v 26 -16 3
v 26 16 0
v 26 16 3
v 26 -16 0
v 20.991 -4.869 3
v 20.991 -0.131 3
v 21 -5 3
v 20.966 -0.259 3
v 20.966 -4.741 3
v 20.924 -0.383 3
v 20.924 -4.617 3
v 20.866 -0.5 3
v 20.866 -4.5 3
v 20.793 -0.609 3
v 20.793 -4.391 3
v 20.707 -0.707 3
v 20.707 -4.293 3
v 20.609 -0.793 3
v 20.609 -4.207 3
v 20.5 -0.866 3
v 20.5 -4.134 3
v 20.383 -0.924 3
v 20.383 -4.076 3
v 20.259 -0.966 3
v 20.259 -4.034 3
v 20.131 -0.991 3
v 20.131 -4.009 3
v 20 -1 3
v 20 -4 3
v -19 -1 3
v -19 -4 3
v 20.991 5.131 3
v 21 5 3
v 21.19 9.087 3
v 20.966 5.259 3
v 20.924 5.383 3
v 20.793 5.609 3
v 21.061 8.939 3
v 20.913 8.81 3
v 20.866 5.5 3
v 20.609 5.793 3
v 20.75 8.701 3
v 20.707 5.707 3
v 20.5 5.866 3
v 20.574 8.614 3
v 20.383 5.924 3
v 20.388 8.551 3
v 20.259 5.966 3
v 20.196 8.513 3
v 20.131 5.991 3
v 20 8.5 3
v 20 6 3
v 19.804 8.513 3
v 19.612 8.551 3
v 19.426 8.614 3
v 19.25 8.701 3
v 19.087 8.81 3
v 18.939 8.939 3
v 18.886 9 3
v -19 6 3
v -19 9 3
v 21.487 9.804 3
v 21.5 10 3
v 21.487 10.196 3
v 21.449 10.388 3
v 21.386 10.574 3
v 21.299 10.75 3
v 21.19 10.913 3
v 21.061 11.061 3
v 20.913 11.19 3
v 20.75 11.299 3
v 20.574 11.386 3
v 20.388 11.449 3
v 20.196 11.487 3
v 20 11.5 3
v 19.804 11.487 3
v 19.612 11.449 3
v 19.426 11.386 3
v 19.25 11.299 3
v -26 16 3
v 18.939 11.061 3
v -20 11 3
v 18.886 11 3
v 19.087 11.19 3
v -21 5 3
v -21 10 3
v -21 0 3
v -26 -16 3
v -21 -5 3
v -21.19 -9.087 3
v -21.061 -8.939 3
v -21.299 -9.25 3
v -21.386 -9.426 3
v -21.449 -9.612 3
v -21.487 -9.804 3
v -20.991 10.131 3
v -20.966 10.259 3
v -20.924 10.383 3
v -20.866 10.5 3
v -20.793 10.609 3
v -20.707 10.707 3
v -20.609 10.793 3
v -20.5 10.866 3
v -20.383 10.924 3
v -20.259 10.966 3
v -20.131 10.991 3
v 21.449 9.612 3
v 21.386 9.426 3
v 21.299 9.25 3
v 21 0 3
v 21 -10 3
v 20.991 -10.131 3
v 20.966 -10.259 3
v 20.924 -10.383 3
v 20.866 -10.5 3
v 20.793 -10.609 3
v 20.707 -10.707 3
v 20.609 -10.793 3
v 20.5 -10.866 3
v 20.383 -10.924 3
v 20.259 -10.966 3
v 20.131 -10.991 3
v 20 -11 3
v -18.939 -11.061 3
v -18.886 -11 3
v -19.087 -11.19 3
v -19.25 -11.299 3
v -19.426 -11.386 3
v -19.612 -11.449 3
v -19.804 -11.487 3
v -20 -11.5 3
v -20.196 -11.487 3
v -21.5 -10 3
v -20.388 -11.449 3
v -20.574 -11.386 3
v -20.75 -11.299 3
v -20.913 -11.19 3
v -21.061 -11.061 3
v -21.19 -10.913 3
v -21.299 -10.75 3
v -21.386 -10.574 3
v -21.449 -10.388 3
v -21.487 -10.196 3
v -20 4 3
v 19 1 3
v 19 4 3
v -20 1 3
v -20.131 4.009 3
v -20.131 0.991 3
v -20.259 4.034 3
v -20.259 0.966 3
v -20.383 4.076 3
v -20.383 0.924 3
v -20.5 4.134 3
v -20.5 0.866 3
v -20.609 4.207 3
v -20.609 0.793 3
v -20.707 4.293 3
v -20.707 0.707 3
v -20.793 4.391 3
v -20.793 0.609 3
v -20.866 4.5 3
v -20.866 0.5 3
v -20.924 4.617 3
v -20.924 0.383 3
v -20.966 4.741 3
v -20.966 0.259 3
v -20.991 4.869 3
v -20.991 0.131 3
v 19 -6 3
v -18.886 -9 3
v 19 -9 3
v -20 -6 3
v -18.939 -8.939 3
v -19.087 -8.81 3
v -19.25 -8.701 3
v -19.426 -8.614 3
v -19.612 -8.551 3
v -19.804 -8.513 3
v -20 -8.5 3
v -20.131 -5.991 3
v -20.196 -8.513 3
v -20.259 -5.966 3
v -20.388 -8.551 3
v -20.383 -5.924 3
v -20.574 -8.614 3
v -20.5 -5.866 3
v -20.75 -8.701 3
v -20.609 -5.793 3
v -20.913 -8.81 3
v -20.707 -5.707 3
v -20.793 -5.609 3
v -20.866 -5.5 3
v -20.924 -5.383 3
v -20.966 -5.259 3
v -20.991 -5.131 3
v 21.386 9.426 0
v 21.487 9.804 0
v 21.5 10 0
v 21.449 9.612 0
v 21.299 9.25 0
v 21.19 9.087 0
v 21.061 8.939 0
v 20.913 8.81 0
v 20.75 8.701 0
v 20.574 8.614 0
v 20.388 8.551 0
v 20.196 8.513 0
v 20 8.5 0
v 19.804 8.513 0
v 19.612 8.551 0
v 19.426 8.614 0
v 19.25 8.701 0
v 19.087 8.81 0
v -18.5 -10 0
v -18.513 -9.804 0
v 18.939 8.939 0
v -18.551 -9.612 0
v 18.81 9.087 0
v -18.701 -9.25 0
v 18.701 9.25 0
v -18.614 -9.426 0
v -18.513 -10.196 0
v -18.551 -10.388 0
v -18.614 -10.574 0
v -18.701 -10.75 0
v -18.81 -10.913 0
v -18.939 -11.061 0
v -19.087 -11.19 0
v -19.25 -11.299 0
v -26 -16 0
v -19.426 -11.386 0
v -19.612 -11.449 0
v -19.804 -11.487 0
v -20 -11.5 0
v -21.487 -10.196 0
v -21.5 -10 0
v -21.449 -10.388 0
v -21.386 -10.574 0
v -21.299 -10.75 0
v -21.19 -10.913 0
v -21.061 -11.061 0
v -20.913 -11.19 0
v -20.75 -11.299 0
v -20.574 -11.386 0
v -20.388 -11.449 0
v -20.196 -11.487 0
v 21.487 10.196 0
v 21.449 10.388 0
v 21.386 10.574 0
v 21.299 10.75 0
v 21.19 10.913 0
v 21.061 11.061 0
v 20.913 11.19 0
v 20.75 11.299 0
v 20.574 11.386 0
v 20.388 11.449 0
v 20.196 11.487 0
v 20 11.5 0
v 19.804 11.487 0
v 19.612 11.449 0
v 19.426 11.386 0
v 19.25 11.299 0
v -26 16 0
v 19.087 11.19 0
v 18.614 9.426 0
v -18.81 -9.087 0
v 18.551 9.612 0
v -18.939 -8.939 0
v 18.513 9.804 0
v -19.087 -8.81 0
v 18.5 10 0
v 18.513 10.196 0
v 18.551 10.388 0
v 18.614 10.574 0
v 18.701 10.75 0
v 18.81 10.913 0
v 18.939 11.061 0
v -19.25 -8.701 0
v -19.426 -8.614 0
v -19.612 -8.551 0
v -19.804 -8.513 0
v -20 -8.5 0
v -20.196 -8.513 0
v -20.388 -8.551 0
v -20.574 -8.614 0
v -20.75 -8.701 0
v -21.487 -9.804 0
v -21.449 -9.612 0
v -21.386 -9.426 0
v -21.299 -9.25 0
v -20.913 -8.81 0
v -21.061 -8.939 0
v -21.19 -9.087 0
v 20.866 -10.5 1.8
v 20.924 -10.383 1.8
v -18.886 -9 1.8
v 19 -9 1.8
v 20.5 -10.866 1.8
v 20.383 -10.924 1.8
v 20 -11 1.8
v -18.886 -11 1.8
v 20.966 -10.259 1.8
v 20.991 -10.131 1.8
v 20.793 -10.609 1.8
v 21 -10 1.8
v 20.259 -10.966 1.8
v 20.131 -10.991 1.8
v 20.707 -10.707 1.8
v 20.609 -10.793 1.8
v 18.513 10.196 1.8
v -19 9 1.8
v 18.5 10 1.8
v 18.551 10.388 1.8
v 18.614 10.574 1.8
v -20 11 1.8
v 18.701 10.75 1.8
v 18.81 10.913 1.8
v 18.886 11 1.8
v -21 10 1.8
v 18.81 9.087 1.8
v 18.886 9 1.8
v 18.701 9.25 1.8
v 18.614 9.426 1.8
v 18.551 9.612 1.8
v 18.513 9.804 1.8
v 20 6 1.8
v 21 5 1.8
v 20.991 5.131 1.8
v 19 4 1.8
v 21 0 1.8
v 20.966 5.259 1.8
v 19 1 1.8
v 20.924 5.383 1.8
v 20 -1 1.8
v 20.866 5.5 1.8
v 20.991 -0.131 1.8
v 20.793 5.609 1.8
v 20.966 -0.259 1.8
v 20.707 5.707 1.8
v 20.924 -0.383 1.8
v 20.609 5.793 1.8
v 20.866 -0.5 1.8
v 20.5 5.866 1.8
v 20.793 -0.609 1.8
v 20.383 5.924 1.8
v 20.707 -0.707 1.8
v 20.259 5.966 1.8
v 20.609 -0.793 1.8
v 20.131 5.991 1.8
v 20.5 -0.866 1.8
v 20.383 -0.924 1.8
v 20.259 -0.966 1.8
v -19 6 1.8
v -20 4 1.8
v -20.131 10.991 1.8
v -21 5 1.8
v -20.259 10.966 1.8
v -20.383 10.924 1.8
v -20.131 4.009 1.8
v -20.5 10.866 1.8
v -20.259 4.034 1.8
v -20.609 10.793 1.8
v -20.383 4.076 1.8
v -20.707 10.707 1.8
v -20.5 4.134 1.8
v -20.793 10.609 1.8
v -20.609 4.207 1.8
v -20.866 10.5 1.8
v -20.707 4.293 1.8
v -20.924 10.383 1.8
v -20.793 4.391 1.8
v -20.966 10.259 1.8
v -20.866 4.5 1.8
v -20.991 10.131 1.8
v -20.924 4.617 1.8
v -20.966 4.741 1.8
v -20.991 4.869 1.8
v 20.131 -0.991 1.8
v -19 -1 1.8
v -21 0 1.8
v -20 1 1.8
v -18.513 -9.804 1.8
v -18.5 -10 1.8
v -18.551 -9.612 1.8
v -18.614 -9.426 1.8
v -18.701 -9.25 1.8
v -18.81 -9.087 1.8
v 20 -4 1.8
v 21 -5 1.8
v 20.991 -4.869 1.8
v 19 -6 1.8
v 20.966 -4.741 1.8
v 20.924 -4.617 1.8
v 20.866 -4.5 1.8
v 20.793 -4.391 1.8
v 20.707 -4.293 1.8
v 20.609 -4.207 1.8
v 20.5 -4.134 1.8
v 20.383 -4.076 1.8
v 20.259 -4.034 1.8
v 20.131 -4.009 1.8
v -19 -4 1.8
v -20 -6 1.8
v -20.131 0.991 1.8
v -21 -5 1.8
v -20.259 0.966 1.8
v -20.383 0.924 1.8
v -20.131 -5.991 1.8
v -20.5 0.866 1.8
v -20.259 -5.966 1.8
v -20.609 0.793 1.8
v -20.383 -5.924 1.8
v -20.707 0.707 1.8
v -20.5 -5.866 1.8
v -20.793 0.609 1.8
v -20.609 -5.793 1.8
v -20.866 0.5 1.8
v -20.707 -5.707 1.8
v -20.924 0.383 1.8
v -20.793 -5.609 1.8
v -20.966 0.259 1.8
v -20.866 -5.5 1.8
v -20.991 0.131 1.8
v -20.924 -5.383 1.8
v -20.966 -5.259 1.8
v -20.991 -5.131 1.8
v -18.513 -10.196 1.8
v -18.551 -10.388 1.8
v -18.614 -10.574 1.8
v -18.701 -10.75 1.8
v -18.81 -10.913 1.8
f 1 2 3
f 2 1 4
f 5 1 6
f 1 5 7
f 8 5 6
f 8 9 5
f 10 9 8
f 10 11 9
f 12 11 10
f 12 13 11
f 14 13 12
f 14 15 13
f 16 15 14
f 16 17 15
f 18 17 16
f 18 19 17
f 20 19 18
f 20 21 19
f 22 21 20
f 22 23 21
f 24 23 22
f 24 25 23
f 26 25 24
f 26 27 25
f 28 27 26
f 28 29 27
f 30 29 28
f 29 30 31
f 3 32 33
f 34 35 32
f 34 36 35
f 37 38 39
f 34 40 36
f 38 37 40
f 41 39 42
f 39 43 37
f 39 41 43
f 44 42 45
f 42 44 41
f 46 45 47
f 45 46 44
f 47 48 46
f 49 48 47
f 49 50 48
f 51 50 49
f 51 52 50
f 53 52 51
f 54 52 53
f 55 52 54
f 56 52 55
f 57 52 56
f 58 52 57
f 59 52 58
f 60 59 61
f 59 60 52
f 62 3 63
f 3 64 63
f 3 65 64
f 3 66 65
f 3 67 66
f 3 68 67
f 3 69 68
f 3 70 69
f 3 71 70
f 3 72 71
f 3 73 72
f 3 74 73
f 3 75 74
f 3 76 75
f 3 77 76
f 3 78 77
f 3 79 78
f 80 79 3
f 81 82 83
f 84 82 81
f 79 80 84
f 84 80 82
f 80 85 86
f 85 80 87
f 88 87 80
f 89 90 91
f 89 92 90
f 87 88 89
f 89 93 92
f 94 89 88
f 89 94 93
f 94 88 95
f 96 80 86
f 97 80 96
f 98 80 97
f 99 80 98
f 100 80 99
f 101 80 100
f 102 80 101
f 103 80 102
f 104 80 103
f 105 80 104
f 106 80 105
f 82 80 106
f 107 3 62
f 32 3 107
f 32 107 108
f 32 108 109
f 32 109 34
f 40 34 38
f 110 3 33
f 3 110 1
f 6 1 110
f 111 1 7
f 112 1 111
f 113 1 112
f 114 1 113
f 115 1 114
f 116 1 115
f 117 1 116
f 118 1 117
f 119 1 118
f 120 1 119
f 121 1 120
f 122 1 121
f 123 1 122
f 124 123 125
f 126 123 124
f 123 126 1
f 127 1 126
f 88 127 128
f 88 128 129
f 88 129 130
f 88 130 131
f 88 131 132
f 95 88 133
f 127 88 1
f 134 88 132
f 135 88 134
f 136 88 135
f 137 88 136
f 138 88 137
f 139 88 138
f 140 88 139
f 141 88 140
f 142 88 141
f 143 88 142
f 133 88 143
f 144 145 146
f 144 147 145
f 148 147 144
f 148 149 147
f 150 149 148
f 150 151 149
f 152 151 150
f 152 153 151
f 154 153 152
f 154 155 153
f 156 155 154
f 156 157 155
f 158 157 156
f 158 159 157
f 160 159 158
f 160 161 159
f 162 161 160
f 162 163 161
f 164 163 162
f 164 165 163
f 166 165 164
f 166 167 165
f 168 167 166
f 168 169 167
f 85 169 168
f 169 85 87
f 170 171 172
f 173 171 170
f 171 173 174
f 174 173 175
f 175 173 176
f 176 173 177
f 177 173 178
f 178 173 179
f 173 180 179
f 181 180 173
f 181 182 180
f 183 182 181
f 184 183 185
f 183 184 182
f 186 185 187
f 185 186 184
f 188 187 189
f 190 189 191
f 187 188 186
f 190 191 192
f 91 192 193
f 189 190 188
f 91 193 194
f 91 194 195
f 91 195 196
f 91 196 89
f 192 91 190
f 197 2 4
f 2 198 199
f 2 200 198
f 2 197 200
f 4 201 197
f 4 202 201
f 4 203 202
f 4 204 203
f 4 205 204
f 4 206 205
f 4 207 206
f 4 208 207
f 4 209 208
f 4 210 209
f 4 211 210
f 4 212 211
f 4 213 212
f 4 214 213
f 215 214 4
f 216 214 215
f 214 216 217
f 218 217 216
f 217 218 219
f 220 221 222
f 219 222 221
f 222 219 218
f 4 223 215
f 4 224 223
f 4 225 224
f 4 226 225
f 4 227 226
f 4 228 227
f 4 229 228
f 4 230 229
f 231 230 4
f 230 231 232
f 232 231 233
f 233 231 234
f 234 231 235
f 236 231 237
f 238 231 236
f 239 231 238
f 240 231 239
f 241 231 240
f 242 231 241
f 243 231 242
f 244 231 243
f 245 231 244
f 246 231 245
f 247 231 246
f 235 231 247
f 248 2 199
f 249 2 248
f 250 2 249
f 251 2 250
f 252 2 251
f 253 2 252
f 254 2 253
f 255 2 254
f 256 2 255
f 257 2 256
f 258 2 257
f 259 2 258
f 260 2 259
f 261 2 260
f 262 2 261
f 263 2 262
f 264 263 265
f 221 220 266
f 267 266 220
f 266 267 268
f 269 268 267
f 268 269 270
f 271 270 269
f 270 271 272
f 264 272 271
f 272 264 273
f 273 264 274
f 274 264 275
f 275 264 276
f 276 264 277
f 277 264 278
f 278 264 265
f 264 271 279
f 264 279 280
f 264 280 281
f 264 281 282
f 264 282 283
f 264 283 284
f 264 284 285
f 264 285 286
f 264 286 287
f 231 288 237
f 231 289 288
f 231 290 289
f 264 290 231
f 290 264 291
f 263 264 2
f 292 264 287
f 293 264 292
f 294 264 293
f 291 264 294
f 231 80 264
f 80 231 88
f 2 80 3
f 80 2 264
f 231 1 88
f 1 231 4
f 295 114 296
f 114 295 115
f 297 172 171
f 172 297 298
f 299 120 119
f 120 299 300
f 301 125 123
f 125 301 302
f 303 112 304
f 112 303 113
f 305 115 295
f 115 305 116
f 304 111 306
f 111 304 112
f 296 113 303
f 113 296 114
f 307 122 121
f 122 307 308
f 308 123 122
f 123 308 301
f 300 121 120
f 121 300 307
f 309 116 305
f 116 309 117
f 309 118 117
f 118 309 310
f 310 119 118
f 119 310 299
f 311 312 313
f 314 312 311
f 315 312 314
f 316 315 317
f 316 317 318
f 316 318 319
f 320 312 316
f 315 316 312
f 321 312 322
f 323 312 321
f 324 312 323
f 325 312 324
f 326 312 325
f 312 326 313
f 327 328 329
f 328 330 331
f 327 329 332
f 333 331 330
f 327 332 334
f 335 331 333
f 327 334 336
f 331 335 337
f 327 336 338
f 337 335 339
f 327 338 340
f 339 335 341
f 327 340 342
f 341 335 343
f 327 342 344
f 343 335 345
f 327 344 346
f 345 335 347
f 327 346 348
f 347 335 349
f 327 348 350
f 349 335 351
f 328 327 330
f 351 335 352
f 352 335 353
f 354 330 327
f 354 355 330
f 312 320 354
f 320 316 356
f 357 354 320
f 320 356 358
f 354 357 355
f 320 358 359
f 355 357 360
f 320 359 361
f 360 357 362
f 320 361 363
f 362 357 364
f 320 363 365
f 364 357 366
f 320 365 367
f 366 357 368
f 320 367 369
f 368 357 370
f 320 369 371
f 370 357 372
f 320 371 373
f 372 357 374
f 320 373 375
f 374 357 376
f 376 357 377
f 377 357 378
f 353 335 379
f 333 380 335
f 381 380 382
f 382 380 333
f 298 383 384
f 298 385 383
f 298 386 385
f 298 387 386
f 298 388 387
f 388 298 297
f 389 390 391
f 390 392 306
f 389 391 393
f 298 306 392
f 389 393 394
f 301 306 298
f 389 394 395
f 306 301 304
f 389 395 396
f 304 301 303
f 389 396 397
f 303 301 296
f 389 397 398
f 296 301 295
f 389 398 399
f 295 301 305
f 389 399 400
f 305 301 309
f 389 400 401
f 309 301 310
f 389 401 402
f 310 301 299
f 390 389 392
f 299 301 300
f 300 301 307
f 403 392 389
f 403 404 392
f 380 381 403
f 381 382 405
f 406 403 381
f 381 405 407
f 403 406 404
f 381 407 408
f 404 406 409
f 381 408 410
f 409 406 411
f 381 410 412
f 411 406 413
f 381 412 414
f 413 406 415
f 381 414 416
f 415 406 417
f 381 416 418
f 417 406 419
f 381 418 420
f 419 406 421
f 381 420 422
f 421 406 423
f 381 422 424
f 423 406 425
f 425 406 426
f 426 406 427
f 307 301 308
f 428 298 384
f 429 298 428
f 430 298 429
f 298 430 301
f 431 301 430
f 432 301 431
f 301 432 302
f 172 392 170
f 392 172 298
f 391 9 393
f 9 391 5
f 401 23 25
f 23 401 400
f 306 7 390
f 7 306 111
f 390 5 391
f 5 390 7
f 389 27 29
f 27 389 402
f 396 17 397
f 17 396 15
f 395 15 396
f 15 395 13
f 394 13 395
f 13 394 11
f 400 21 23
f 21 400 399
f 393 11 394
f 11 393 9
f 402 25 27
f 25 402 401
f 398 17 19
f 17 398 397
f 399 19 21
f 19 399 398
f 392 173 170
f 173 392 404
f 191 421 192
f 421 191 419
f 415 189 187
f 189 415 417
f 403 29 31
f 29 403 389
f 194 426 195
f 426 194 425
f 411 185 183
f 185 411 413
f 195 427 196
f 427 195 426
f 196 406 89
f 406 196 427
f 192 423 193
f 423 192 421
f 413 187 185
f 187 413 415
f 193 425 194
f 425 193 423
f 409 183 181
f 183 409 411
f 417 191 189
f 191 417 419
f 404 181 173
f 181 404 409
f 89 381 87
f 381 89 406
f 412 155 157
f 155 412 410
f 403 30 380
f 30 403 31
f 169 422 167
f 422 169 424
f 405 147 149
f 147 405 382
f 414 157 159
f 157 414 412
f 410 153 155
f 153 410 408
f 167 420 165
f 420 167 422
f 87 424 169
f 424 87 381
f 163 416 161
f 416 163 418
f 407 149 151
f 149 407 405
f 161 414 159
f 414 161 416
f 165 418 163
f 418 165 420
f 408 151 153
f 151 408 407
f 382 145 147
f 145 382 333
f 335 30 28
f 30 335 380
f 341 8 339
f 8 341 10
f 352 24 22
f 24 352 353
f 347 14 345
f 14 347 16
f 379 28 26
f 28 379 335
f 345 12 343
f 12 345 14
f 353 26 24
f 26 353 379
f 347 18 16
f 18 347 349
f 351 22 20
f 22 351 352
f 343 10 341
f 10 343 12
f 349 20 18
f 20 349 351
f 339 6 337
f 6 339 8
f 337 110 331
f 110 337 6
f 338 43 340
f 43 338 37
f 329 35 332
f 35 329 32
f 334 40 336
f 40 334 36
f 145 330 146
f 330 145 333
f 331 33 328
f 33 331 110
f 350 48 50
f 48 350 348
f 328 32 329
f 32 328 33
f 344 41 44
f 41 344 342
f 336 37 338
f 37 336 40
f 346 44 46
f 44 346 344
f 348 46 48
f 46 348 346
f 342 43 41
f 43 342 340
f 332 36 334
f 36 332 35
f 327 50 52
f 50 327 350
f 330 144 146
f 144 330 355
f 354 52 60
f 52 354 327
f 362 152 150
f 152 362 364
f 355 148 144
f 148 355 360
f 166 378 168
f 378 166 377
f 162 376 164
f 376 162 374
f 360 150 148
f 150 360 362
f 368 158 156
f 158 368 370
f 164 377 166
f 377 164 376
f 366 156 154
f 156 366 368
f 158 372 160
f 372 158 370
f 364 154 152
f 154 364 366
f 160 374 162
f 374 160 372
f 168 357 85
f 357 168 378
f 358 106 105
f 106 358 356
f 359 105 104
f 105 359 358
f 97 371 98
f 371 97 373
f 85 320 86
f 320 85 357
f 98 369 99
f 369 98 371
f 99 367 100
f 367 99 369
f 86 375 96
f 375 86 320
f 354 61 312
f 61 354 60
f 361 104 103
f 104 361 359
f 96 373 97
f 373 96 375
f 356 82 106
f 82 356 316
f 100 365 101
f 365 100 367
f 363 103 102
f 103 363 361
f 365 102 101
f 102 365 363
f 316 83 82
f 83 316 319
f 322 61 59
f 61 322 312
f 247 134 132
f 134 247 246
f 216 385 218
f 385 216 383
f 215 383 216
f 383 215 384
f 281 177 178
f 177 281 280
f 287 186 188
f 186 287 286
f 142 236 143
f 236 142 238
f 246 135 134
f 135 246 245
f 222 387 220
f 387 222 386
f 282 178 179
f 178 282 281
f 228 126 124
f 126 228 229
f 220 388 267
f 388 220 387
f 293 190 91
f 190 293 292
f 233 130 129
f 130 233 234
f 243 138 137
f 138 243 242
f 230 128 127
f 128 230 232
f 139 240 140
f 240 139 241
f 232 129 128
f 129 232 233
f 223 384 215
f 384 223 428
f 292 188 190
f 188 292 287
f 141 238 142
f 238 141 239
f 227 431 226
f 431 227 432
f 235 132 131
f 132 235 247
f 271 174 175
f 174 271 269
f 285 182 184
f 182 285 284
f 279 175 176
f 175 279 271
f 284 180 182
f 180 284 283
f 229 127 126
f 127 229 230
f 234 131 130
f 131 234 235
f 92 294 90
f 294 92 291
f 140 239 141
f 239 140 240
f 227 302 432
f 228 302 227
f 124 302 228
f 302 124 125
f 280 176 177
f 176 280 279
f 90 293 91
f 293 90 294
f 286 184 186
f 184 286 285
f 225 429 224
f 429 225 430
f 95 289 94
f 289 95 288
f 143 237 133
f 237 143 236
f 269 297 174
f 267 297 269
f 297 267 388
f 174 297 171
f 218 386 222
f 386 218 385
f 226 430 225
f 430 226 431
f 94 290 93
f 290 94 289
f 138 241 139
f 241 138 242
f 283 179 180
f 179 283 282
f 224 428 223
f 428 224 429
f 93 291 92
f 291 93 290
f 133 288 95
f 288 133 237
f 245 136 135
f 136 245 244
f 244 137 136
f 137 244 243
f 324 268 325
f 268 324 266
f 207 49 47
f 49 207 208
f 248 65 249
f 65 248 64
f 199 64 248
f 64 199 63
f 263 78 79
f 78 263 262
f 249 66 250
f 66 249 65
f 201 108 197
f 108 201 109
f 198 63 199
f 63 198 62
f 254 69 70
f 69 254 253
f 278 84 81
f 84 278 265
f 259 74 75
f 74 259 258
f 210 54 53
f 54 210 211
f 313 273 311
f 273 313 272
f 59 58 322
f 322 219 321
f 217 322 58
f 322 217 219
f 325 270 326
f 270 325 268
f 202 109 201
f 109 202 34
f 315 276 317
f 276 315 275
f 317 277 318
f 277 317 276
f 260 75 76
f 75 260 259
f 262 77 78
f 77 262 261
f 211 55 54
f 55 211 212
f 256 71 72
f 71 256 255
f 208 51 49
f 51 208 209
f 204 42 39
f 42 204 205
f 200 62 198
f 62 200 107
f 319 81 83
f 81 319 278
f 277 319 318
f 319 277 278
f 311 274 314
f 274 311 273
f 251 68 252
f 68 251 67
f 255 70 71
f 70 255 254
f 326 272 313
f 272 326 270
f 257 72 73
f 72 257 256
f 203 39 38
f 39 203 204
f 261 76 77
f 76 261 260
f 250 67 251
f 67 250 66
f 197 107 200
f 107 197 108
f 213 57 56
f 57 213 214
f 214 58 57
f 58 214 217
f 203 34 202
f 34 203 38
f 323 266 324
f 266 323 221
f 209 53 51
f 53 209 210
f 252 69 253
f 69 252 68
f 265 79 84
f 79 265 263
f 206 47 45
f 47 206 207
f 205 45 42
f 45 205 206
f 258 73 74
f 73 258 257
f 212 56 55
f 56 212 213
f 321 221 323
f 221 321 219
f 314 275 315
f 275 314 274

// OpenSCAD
$fn = 48;
module channel(a,b,w=2,d=1.2) {
    hull() {
        translate([a[0],a[1],3-d]) cylinder(h=d+0.2,d=w);
        translate([b[0],b[1],3-d]) cylinder(h=d+0.2,d=w);
    }
}
module microfluidic_lid() {
    difference() {
        translate([-26,-16,0]) cube([52,32,3]);
        channel([-20,-10],[20,-10]);
        channel([20,-10],[20,-5]);
        channel([20,-5],[-20,-5]);
        channel([-20,-5],[-20,0]);
        channel([-20,0],[20,0]);
        channel([20,0],[20,5]);
        channel([20,5],[-20,5]);
        channel([-20,5],[-20,10]);
        channel([-20,10],[20,10]);
        translate([-20,-10,-1]) cylinder(h=5,d=3);
        translate([20,10,-1]) cylinder(h=5,d=3);
    }
}
microfluidic_lid();
